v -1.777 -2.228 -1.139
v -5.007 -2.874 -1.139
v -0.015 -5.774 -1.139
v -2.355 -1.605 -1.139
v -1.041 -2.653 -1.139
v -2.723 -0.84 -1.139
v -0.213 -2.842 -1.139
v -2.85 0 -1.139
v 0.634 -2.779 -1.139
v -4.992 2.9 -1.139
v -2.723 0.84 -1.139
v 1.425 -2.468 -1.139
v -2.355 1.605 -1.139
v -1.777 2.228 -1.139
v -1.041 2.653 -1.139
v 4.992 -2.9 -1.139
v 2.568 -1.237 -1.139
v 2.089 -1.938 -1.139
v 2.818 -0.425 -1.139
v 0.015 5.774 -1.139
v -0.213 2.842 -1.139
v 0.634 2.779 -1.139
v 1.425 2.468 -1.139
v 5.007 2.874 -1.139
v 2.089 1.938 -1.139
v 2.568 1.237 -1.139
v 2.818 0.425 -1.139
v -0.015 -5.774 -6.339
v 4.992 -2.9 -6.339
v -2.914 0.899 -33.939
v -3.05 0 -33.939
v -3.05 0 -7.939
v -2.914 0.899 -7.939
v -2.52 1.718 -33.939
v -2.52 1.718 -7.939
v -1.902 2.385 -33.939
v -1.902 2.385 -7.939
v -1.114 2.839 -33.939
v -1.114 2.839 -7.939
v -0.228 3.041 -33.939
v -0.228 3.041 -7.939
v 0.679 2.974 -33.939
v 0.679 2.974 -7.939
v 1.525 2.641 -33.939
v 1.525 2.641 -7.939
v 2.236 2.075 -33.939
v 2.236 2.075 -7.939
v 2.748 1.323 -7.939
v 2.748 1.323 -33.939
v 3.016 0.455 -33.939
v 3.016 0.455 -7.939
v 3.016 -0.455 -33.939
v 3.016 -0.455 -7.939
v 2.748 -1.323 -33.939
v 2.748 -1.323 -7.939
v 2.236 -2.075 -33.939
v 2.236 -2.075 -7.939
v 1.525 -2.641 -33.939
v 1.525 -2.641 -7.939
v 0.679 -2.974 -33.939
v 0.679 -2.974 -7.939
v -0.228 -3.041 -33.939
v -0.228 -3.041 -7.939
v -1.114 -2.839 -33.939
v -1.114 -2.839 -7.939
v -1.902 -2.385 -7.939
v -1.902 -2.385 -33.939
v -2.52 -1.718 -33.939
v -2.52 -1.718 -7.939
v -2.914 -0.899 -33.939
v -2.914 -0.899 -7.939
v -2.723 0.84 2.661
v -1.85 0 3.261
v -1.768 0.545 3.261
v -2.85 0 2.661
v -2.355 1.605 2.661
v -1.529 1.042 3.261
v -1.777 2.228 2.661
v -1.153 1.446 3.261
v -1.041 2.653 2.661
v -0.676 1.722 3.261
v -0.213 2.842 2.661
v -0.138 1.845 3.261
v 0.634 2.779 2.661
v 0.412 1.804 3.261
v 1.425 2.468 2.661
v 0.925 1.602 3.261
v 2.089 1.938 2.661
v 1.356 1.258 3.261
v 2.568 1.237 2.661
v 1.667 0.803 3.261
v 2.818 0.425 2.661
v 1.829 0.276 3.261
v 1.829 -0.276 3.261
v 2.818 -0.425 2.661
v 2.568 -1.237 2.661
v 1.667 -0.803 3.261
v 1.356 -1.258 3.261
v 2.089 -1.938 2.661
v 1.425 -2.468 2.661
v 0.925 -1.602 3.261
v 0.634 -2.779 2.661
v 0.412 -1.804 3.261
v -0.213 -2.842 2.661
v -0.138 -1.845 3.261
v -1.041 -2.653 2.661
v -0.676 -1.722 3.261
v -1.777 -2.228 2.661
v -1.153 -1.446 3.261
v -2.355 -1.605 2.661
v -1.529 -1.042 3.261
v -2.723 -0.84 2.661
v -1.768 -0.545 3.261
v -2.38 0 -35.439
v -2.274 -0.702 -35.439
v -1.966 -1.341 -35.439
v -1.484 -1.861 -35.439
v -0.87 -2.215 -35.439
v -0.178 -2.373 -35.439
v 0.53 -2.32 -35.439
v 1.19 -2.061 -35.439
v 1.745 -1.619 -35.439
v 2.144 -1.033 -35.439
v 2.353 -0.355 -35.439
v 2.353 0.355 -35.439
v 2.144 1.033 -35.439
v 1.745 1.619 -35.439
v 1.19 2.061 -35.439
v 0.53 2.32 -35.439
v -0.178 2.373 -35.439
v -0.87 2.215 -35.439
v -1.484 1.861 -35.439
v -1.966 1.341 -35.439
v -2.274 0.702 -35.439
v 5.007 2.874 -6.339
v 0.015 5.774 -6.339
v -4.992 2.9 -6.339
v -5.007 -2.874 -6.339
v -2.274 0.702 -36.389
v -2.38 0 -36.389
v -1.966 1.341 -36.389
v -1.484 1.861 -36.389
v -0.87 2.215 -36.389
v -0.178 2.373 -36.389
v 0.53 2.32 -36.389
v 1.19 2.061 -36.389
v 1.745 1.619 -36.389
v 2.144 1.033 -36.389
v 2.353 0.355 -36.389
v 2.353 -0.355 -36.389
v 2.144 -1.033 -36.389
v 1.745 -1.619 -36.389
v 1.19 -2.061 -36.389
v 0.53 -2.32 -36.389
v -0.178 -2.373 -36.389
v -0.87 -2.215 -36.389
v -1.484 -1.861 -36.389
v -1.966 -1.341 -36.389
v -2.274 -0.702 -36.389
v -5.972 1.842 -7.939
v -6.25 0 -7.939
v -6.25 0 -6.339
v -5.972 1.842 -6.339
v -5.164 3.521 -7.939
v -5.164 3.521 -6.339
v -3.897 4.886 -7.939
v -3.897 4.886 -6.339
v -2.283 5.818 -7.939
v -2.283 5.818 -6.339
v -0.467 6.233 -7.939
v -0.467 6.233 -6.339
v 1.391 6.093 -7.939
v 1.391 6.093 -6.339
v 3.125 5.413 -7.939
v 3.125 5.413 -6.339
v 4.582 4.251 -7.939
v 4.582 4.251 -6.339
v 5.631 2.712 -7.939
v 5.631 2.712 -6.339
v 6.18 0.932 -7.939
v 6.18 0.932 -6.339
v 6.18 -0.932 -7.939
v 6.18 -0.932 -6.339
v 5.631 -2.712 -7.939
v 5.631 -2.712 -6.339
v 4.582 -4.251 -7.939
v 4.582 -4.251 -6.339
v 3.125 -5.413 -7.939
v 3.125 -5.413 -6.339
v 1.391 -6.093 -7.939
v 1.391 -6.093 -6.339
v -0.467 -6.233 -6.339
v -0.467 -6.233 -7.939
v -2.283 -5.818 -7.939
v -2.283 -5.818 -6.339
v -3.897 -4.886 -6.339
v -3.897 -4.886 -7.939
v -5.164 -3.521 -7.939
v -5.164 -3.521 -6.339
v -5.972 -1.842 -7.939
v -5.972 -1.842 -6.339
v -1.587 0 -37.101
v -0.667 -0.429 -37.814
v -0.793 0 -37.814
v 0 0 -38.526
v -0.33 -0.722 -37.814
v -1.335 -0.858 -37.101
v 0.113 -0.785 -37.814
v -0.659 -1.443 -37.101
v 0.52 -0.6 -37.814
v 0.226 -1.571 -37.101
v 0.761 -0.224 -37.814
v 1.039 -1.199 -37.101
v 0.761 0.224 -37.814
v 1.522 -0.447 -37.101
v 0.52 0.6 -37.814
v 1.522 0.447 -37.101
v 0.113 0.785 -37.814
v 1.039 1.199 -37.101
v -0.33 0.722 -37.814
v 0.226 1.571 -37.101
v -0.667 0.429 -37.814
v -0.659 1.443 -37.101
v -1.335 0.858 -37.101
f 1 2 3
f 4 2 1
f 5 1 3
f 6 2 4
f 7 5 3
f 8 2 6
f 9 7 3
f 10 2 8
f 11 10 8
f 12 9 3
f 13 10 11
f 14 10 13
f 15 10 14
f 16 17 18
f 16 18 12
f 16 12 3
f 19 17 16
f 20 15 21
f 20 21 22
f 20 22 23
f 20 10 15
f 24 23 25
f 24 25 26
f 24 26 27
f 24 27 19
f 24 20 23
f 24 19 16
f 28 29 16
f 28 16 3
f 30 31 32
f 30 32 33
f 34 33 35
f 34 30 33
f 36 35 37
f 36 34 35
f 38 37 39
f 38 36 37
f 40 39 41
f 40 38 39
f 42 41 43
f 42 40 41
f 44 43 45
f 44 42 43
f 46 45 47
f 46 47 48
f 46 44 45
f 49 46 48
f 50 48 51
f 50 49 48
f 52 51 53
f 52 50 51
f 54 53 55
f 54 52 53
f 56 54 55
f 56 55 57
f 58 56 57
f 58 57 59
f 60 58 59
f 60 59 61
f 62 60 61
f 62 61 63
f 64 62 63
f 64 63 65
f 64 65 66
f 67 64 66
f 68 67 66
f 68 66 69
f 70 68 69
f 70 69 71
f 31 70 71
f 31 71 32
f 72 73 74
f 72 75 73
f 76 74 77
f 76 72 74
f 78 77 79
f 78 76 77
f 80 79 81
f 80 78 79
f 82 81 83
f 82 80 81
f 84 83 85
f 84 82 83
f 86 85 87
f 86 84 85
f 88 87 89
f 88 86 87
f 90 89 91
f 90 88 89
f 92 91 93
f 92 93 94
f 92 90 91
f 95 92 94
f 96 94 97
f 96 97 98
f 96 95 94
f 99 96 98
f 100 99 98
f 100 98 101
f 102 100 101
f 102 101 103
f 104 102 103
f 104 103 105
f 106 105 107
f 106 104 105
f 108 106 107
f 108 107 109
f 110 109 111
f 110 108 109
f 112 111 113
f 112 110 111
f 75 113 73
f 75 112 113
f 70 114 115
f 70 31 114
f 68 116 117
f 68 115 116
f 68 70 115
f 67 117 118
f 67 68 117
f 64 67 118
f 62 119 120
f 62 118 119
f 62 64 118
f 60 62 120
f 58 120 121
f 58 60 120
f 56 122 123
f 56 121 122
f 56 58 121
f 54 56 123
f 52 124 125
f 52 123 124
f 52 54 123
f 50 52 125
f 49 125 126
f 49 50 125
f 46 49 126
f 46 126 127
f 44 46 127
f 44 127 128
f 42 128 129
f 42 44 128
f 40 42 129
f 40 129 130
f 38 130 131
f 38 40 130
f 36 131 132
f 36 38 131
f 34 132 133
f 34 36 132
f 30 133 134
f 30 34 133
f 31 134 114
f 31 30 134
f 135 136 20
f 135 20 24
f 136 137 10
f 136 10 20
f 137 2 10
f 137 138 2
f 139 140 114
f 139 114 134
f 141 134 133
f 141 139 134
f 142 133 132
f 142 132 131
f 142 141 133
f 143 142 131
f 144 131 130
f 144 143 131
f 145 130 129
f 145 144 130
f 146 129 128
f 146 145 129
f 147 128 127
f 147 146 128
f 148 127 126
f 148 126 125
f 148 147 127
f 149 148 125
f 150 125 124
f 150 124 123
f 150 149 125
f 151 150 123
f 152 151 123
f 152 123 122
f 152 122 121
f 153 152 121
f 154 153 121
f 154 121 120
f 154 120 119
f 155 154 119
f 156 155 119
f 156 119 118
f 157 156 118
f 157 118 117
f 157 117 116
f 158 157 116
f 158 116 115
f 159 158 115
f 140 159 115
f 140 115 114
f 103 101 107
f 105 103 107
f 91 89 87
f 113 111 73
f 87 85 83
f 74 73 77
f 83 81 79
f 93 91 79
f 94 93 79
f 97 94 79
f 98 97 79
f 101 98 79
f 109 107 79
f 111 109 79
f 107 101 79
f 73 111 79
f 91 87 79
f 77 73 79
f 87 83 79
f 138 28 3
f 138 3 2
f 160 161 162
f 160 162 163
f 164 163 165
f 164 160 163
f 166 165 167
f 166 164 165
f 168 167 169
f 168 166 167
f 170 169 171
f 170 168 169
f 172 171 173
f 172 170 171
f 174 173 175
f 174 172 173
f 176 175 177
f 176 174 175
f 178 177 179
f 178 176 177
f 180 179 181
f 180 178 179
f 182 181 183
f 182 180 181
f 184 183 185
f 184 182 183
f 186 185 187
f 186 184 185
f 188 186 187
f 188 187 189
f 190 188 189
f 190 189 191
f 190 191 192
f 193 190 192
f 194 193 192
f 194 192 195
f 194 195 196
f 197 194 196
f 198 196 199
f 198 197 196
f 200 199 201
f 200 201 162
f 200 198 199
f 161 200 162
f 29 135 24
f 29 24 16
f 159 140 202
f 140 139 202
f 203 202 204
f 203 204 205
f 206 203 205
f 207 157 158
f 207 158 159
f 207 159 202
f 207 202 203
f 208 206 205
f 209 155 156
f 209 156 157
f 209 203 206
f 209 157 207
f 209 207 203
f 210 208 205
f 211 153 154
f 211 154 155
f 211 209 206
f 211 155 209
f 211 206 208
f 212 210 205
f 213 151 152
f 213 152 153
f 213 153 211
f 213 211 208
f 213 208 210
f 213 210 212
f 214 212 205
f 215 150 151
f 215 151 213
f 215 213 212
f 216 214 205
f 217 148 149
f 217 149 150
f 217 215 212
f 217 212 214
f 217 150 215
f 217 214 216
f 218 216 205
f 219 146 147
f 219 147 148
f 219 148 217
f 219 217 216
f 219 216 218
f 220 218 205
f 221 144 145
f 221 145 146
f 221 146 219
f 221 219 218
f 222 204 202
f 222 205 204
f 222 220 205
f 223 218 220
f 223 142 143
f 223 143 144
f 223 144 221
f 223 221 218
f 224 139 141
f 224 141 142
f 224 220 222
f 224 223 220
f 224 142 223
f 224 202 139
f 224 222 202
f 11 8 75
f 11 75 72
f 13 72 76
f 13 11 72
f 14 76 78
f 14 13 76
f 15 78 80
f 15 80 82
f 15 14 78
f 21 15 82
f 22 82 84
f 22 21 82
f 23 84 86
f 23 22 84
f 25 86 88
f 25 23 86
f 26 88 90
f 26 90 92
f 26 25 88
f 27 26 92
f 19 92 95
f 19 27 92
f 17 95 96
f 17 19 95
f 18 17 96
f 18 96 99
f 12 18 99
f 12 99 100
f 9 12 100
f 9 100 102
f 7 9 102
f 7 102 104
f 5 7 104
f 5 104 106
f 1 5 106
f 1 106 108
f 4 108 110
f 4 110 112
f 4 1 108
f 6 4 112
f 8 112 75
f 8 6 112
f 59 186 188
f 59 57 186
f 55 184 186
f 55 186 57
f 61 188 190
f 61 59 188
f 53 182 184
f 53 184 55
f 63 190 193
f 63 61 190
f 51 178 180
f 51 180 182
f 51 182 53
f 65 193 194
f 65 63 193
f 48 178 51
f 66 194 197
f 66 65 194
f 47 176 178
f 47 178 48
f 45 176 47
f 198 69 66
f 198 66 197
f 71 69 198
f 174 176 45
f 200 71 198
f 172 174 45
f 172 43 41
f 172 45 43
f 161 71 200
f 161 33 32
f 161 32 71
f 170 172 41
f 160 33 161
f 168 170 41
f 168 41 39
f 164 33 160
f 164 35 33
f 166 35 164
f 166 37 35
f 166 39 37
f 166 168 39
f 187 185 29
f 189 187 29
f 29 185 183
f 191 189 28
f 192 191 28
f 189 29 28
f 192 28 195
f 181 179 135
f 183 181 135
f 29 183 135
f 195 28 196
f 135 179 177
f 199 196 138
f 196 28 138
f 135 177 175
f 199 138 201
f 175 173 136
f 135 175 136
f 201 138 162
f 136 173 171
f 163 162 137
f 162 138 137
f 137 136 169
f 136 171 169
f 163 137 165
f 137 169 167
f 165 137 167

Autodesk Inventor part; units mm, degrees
ref_plane "YZ Plane" through (0, 0, 0) normal (1, 0, 0) x (0, 1, 0)
ref_plane "XZ Plane" through (0, 0, 0) normal (0, 1, 0) x (-1, 0, 0)
ref_plane "XY Plane" through (0, 0, 0) normal (0, 0, 1) x (1, 0, 0)
sketch "Szkic1" plane through (0, 0, 0) normal (0, 1, 0) x (-1, 0, 0)
  line L0 (0, 3.2611) -> (1.85, 3.2611)
  line L1 (1.85, 3.2611) -> (2.85, 2.6611)
  line L2 (2.85, 2.6611) -> (2.85, -6.3389)
  line L3 (2.85, -6.3389) -> (6.25, -6.3389)
  line L4 (6.25, -6.3389) -> (6.25, -7.9389)
  line L5 (6.25, -7.9389) -> (3.05, -7.9389)
  line L6 (3.05, -7.9389) -> (3.05, -33.9389)
  line L7 (3.05, -33.9389) -> (2.38, -35.4389)
  line L8 (2.38, -35.4389) -> (2.38, -36.3889)
  line L9 (2.38, -36.3889) -> (0, -38.5259)
  line L10 (0, 3.2611) -> (0, -38.5259)
  point P0 (0, 0)
  dimension "d0" = 1.85
  dimension "d1" = 0.6
  dimension "d2" = 1
  dimension "d3" = 9
  dimension "d4" = 3.4
  dimension "d5" = 1.6
  dimension "d6" = 3.2
  dimension "d7" = 26
  dimension "d8" = 1.5
  dimension "d9" = 0.67
  dimension "d10" = 0.95
  dimension "d11" = 2.137
revolve "Obrót1" add sketch "Szkic1" angle 360 about axis through (0, 0, 3.2611) along (0, 0, -1)
sketch "Szkic2" plane through (0, 0, -6.3389) normal (0, 0, 1) x (1, 0, 0)
  circle A0 centre (0, 0) radius 1.85 projected
  line L0 (5.0074, 2.8738) -> (4.9925, -2.8997)
  line L1 (4.9925, -2.8997) -> (-0.0149, -5.7735)
  line L2 (-0.0149, -5.7735) -> (-5.0074, -2.8738)
  line L3 (-5.0074, -2.8738) -> (-4.9925, 2.8997)
  line L4 (-4.9925, 2.8997) -> (0.0149, 5.7735)
  line L5 (0.0149, 5.7735) -> (5.0074, 2.8738)
  circle A1 centre (0, 0) radius 5
  point P0 (0, 0)
  dimension "d13" = 10
sketch "Szkic3" plane through (0, 0, -7.9389) normal (0, 0, -1) x (-1, 0, 0)
  point P0 (0, 0)
extrude "Wyciągnięcie proste1" add sketch "Szkic2" along normal blind 5.2 contours A0 | L0 L1 A1 | L0 A1 L5 | A1 | A1 L4 L5 | L1 L2 A1 | A1 L3 L4 | L2 L3 A1
thread "Gwint1" size "M7x1" class "6g" standard "ANSI Metric M Profile" length 200
sketch "Szkic4" plane through (0, 0, -7.9389) normal (0, 0, -1) x (-1, 0, 0)
  point P0 (0, 0)
sketch "Szkic5" plane through (5.0074, 2.8738, -1.1389) normal (1, -0.0026, 0) x (0, 0, -1)
  point P0 (-1.1389, -2.8868)
sketch "Szkic6" plane through (0, 0, -7.9389) normal (0, 0, -1) x (-1, 0, 0)
  point P0 (0, 0)
sketch "Szkic7" plane through (5.0074, 2.8738, -1.1389) normal (1, -0.0026, 0) x (0, 0, -1)
  point P0 (-1.1389, -2.8868)
properties part number "śróbki1" material "Stal nierdzewna"
